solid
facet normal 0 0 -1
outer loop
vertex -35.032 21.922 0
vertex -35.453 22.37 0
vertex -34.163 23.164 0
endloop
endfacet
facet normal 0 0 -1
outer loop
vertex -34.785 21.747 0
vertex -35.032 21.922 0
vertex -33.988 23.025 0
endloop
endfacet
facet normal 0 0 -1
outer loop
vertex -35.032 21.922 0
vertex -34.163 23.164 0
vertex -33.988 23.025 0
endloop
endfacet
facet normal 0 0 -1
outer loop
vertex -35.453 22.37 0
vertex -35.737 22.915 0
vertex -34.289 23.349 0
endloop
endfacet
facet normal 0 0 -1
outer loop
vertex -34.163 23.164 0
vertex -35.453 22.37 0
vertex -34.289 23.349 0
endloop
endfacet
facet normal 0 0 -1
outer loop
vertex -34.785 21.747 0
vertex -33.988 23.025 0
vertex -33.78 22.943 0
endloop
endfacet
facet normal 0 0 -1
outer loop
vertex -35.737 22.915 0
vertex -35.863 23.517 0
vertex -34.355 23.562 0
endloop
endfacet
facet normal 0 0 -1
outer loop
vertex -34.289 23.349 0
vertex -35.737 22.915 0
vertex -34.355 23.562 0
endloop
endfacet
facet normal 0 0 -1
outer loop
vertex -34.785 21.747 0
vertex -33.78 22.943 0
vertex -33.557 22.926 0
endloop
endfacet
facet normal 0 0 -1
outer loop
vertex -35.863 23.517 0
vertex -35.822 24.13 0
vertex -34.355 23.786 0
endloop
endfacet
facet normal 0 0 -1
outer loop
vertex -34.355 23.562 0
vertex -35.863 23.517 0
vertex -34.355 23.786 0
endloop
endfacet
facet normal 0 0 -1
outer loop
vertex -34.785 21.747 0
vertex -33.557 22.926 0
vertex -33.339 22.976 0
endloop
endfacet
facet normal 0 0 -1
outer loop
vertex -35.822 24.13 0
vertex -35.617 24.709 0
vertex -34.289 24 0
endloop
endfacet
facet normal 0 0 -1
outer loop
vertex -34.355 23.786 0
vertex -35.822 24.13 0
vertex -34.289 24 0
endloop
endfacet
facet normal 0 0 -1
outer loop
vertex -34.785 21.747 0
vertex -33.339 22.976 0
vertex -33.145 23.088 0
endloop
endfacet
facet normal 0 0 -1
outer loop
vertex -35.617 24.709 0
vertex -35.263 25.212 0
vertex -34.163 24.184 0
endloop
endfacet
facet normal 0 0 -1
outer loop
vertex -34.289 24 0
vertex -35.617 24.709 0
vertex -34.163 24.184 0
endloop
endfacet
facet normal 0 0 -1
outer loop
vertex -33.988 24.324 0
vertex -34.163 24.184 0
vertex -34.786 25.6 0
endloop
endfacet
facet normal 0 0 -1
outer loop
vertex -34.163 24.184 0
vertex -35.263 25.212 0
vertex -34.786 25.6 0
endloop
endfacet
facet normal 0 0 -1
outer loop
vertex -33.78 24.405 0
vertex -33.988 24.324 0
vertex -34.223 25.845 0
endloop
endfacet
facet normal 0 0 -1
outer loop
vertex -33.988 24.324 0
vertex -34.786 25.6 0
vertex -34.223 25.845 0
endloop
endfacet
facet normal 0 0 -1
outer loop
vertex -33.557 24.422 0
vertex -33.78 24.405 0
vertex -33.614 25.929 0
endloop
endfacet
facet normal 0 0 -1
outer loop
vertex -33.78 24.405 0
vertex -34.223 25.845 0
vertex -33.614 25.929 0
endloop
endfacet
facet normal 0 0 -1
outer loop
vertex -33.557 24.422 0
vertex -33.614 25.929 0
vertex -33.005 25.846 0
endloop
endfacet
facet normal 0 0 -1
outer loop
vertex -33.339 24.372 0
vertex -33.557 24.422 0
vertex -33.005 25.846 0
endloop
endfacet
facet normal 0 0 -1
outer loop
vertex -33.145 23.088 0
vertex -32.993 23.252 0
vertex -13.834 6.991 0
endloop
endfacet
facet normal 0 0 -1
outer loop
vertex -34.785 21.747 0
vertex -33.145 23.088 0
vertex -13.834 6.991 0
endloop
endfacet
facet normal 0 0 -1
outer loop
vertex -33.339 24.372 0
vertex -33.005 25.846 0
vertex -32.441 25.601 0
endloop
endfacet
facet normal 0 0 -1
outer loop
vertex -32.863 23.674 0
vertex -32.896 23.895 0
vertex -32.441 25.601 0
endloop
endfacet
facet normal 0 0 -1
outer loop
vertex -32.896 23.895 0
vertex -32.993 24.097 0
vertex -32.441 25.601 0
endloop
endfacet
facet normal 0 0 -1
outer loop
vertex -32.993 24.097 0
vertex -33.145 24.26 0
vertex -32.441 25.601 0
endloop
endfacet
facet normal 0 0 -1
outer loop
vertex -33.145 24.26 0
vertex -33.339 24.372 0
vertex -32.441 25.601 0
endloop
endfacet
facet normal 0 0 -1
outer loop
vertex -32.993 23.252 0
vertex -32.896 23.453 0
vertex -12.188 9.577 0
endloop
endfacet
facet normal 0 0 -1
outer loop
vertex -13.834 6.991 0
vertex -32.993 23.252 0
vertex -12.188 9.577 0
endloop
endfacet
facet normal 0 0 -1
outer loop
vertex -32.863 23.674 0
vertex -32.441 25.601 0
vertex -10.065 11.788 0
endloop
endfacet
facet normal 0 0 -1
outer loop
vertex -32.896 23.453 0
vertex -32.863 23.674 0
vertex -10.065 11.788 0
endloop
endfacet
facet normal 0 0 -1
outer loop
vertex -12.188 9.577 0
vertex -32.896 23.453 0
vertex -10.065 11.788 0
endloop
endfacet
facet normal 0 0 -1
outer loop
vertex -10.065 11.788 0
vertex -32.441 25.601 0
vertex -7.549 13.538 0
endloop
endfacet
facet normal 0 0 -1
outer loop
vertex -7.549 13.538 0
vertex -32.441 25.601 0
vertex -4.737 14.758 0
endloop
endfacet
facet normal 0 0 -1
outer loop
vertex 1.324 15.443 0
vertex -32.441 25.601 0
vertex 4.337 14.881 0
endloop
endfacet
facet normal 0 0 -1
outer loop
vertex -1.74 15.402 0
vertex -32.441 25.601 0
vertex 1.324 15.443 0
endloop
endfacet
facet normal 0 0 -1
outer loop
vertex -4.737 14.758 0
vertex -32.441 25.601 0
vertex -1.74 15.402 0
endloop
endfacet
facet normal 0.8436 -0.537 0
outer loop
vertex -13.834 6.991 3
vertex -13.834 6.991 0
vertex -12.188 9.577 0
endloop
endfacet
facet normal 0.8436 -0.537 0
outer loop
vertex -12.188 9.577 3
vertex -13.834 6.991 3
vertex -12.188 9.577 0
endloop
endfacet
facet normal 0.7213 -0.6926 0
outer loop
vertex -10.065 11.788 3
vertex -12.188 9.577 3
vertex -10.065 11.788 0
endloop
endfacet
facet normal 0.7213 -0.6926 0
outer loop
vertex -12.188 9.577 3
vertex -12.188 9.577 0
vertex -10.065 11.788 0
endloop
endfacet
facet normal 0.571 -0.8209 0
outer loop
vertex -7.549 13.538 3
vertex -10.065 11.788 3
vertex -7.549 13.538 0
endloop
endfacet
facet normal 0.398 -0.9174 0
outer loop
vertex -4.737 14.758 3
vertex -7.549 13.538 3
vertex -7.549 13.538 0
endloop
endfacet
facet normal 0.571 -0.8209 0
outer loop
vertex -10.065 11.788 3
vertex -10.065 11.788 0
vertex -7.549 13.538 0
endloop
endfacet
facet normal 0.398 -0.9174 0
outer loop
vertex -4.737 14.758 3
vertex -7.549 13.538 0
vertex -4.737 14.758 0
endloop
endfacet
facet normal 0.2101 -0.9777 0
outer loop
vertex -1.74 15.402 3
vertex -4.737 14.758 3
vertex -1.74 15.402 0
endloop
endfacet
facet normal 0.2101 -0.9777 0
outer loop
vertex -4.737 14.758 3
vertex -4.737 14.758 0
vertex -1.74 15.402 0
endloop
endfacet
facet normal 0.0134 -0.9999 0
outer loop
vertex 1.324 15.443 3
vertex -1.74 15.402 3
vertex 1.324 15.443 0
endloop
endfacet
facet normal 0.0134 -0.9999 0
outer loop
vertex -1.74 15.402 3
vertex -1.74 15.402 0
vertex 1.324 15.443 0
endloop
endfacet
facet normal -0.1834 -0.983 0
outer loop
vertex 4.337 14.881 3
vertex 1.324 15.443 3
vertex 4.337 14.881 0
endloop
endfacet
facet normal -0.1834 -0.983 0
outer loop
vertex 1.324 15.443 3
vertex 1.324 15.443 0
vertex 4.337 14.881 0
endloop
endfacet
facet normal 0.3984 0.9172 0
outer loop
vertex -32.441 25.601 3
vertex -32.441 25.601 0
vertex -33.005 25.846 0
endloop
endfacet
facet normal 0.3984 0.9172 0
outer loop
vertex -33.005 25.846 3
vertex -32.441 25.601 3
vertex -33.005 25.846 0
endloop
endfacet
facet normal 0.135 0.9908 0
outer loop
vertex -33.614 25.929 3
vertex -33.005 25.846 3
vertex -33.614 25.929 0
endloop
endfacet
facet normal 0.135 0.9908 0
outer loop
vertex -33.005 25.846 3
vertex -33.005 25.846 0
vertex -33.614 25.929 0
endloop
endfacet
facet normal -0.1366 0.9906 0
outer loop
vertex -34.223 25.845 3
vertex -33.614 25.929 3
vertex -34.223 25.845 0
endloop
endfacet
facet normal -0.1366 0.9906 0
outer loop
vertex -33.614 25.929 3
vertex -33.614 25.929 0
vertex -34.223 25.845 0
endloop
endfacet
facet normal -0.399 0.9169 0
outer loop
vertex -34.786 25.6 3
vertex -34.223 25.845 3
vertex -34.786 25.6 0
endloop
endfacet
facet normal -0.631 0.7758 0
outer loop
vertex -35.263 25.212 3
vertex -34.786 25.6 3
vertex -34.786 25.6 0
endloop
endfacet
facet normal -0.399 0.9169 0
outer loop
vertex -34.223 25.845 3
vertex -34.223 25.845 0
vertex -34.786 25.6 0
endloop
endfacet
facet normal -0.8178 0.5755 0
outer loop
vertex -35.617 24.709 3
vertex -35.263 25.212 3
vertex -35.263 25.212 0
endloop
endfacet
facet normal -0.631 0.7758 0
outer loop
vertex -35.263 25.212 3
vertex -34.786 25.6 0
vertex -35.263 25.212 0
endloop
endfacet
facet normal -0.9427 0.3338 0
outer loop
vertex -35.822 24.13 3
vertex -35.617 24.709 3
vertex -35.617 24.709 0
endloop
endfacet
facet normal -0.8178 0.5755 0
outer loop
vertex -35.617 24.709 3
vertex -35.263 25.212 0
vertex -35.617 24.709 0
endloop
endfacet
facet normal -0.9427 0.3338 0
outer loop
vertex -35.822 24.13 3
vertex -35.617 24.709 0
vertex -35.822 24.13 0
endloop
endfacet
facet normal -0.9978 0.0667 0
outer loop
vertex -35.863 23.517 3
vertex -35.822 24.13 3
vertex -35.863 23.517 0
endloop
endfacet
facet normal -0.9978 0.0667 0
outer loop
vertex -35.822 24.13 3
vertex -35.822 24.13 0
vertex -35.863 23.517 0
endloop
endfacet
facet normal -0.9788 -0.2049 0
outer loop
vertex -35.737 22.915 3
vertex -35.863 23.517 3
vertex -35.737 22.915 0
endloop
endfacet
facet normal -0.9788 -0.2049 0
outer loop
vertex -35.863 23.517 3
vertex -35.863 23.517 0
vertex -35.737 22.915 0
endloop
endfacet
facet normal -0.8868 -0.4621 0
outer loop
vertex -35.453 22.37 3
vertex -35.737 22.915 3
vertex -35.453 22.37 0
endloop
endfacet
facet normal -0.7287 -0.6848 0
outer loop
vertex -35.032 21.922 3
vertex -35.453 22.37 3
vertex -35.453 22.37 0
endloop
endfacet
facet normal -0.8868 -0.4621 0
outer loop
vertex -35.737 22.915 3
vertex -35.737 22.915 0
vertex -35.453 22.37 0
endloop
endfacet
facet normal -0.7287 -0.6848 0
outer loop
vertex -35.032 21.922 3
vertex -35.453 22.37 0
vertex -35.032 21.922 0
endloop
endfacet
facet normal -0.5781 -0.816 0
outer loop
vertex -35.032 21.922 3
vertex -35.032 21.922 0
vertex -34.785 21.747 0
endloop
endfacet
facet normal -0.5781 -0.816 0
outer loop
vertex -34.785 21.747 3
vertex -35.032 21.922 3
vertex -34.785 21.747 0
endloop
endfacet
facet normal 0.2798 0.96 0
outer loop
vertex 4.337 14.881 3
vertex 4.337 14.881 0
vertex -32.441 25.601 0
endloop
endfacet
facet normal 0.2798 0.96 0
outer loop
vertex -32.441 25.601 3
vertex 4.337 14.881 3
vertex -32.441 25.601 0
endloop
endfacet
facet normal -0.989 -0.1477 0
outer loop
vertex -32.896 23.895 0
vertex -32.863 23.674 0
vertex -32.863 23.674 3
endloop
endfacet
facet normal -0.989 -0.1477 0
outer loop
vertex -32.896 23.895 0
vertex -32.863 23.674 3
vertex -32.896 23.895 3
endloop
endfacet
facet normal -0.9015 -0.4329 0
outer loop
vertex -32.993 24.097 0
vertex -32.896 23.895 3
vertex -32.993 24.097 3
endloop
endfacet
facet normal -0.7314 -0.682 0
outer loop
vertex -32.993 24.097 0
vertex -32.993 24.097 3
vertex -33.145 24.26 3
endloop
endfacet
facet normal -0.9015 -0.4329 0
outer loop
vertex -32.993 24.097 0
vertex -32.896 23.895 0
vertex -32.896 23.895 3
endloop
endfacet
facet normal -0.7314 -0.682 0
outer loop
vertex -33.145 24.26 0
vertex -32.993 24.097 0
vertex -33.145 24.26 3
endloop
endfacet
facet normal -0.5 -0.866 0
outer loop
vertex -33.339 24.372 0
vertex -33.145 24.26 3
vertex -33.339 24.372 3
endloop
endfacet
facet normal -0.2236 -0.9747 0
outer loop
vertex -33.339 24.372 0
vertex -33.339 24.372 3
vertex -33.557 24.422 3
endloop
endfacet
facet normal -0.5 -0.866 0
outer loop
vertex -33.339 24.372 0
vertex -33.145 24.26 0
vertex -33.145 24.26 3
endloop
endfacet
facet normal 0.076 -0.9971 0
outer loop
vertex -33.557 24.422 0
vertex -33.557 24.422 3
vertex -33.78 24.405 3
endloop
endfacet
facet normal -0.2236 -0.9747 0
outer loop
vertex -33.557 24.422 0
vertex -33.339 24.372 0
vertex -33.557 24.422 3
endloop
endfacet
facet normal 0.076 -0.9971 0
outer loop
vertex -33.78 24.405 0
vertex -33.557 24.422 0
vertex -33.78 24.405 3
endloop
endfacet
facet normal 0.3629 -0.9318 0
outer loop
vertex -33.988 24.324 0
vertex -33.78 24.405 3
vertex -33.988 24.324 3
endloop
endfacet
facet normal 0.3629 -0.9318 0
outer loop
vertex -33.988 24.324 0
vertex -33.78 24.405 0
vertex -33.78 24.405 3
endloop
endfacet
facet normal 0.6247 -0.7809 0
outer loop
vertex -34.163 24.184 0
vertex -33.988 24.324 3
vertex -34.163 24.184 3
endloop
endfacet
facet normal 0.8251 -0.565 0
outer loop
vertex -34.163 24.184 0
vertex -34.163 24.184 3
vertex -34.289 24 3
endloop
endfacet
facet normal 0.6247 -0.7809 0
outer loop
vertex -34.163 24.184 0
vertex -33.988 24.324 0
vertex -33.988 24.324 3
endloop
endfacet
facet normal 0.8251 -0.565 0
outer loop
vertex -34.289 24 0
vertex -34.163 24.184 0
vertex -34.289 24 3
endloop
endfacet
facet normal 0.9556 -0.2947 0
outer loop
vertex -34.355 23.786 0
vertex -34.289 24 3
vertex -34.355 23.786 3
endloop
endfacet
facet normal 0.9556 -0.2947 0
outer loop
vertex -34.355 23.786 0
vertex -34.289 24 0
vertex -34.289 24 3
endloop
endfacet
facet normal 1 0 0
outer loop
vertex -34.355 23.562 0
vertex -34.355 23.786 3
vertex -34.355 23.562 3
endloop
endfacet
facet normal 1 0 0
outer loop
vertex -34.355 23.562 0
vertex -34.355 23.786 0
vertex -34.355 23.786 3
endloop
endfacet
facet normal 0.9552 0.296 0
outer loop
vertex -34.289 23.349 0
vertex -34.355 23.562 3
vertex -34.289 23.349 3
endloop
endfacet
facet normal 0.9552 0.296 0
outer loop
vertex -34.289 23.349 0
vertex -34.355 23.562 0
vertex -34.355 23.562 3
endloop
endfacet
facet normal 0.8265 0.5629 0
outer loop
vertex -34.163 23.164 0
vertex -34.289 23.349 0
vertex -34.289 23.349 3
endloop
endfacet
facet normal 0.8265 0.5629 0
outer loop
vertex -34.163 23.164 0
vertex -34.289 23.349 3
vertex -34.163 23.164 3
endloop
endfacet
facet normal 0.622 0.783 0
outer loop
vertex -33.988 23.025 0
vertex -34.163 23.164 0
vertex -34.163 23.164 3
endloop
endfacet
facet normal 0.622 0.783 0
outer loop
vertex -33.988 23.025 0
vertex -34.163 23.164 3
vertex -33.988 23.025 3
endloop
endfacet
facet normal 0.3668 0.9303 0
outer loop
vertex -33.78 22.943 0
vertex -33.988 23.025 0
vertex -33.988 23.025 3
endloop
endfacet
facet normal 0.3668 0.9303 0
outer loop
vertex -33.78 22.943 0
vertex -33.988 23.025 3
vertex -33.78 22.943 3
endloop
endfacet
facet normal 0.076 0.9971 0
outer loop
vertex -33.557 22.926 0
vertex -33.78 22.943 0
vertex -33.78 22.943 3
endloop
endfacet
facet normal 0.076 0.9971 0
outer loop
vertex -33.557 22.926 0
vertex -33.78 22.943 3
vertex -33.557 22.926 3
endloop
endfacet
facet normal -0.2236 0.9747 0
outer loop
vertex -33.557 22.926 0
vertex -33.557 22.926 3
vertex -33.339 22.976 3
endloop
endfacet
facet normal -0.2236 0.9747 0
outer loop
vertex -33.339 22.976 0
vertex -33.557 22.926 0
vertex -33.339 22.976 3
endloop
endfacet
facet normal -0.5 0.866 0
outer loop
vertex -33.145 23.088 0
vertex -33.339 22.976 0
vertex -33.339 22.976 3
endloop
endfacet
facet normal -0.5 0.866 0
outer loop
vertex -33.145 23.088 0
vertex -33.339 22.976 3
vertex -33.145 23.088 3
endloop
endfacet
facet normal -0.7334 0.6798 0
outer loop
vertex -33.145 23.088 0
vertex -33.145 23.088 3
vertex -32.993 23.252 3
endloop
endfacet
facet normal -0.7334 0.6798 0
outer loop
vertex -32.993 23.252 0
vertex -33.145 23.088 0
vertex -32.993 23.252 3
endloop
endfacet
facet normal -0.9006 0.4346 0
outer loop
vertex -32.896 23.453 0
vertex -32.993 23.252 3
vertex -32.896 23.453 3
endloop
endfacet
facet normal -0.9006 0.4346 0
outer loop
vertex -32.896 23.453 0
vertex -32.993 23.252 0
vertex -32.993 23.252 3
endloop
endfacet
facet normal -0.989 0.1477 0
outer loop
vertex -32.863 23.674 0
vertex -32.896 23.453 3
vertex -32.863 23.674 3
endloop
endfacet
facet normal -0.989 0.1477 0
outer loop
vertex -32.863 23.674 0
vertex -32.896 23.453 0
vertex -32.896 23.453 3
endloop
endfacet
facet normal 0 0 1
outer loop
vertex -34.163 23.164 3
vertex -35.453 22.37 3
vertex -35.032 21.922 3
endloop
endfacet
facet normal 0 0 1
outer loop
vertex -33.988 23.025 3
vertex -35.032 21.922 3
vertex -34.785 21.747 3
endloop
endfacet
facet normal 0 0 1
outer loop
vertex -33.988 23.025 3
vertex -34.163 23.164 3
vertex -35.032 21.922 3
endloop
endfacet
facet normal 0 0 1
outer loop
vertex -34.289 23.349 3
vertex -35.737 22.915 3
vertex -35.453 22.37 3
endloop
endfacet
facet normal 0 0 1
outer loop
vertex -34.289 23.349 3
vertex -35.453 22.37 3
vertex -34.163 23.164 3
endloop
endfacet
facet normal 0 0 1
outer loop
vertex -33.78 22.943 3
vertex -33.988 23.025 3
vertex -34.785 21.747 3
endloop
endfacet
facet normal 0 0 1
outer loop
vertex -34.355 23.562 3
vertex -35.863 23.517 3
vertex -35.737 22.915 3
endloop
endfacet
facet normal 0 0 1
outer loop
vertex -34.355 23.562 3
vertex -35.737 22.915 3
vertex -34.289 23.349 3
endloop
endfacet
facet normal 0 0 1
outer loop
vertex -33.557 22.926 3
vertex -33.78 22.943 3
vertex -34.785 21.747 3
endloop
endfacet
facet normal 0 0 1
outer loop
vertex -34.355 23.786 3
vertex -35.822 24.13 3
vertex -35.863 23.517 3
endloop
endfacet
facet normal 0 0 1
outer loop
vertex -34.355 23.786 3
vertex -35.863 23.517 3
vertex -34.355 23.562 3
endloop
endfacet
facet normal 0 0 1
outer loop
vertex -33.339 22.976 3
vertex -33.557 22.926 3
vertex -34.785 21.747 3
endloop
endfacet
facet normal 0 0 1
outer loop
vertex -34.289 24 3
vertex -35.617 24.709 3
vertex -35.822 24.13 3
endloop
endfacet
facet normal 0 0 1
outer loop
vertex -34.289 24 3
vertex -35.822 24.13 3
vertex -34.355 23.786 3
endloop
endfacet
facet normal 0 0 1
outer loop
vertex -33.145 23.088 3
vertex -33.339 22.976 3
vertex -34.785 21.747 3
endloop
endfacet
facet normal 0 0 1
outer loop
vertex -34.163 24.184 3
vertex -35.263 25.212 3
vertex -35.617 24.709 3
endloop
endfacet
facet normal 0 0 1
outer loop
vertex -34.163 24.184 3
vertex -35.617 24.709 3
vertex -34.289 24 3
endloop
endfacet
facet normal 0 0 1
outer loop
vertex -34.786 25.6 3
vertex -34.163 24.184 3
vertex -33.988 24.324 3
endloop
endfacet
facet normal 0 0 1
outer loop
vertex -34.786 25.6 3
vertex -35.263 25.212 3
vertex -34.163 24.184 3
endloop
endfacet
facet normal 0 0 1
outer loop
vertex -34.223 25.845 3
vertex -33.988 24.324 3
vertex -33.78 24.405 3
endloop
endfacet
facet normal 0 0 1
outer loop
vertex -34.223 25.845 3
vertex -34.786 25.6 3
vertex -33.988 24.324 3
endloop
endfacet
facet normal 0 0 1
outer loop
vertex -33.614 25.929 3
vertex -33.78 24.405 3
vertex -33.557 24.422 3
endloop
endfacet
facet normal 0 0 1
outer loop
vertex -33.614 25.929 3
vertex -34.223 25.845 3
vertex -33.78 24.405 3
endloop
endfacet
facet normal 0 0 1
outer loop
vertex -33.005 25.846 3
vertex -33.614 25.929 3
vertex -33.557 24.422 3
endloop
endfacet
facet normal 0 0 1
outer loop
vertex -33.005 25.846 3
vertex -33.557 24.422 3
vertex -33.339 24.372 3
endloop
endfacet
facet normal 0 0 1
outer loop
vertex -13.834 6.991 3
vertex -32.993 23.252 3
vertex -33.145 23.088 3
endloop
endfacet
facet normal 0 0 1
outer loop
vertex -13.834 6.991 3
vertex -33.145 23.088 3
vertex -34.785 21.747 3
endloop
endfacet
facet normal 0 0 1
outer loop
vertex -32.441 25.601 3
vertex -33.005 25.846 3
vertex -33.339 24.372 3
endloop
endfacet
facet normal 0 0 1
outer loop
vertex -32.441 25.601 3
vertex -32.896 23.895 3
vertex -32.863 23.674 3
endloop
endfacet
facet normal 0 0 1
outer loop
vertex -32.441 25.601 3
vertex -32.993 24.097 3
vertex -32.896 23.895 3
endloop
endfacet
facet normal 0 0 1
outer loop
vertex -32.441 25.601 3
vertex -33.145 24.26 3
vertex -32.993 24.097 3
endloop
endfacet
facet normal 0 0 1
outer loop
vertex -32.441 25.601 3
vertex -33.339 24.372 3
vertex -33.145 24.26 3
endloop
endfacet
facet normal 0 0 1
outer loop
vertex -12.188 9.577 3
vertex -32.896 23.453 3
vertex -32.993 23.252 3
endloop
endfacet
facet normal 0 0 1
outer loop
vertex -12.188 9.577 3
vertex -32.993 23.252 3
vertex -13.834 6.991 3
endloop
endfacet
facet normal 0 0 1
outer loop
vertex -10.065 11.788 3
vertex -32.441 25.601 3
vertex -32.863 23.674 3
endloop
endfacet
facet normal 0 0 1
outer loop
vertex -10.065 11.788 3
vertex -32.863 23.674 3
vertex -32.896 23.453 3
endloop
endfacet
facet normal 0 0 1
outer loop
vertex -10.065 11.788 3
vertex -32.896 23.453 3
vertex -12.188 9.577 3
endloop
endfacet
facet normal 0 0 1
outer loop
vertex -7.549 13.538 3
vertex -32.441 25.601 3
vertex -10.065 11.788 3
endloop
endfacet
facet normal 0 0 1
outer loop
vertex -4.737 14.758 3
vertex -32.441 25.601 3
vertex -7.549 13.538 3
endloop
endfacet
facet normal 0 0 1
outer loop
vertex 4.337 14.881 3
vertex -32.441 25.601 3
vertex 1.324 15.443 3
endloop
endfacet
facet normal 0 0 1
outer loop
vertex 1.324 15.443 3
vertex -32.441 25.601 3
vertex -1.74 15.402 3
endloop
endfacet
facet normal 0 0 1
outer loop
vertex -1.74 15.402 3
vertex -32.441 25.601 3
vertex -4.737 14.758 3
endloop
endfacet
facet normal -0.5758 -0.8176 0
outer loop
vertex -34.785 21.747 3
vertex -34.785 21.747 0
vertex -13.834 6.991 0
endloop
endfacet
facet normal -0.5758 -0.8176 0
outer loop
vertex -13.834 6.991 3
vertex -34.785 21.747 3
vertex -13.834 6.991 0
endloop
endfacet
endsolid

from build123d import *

# Parameters (mm, degrees)
F0_R     = 0.75
F1_DEPTH = 3


# Not quite as in the source:
# - a feature names something its author has since deleted; it is built from what else it names


with BuildPart() as f1:
    # F0 (on Top) → F1 (new body)
    with BuildSketch(Plane.XY):
        with BuildLine():
            ThreePointArc((-13.8337529302, 6.9912287808), (-6.1730560637, 14.2177135586), (4.3373536701, 14.8807715909))
            Line((4.3373536701, 14.8807715909), (-32.4411373594, 25.6007347374))
            ThreePointArc((-32.4411373594, 25.6007347374), (-35.456761187, 24.972624675), (-35.0323544011, 21.9216595489))
            Line((-35.0323544011, 21.9216595489), (-34.7850043318, 21.747447911))
            Line((-34.7850043318, 21.747447911), (-13.8337529302, 6.9912287808))
        make_face()
        with Locations((-33.6130708456, 23.6740913242)):
            Circle(F0_R, mode=Mode.SUBTRACT)
    extrude(amount=F1_DEPTH)


solid = f1.part
